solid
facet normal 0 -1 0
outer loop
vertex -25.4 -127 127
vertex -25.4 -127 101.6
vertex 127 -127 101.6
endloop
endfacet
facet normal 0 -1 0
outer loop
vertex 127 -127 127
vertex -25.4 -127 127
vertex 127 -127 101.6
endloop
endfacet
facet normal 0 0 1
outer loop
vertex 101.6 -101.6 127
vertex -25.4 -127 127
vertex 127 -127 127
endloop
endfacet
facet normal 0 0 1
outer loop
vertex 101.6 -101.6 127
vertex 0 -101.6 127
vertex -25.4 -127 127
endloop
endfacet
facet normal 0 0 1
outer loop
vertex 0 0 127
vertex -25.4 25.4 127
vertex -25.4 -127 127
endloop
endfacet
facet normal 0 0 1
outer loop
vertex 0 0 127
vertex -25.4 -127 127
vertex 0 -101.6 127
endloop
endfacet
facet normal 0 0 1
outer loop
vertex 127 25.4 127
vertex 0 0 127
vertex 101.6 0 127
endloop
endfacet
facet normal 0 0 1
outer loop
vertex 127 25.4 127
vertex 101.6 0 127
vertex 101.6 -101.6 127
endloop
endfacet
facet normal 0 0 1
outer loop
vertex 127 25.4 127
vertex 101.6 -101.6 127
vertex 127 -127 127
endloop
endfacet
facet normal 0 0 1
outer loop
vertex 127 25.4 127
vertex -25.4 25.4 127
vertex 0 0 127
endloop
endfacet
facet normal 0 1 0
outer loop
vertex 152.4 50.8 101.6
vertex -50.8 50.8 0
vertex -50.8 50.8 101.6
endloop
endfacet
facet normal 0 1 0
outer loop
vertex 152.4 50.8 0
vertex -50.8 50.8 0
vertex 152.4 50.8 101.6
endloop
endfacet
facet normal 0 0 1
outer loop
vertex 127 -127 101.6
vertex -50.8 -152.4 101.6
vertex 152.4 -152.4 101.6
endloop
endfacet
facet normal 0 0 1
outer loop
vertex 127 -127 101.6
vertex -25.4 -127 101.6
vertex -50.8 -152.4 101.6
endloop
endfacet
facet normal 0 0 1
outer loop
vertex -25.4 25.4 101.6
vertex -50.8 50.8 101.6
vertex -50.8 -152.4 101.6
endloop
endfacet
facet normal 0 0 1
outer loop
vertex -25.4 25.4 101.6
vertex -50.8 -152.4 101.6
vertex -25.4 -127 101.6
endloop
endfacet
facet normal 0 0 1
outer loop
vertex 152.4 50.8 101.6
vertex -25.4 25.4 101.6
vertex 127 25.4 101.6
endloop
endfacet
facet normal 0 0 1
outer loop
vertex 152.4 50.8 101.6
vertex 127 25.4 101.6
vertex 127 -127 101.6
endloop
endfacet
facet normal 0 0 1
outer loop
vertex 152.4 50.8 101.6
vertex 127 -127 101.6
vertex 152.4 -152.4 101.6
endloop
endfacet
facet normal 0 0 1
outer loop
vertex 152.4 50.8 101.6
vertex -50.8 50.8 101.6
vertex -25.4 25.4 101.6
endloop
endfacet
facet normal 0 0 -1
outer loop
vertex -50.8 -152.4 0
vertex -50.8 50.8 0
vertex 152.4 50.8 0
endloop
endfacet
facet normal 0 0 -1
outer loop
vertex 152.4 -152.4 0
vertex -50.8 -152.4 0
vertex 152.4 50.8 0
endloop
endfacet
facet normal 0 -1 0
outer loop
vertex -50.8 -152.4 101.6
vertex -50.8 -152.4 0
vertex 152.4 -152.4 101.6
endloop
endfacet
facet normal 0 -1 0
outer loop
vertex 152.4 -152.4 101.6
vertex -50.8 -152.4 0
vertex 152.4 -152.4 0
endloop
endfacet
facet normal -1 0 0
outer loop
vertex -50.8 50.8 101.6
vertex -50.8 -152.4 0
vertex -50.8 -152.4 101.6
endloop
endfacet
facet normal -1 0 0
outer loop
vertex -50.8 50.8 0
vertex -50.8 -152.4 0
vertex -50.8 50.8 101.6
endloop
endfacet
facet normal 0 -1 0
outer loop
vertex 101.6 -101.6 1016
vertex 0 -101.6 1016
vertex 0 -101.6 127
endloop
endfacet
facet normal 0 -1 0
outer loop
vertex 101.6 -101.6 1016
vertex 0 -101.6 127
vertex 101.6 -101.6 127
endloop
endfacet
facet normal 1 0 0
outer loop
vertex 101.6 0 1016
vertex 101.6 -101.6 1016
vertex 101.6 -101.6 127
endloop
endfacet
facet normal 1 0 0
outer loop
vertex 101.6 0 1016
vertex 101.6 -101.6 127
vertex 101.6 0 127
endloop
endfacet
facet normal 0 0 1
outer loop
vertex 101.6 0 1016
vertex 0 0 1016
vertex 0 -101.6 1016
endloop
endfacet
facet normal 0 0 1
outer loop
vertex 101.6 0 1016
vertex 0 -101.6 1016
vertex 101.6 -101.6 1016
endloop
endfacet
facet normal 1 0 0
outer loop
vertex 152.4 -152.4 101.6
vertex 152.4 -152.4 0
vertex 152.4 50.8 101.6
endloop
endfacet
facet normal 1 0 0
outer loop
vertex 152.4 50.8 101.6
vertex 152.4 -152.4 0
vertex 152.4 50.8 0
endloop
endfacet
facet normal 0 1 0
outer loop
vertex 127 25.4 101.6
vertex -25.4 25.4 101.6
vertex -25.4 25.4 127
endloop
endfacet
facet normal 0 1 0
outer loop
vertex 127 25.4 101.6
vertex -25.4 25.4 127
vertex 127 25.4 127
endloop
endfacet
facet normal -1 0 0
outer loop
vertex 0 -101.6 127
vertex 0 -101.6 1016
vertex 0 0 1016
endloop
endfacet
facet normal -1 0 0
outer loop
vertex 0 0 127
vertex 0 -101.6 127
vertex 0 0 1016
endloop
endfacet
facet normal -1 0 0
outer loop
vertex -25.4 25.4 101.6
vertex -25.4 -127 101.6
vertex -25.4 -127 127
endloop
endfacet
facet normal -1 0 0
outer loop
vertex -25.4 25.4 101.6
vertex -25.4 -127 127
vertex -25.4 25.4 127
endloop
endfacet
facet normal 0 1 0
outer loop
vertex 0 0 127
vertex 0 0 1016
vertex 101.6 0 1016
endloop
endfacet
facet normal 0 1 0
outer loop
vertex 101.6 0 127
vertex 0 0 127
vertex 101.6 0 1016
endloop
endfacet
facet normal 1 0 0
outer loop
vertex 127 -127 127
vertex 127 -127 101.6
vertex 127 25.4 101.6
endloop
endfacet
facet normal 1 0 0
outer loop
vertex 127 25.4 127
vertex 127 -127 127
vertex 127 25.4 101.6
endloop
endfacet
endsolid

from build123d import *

# Parameters (mm, degrees)
F0_W     = 101.6
F0_H     = 101.6
F1_DEPTH = 1016
F4_W     = 152.4
F4_H     = 152.4
F5_DEPTH = 127
F6_W     = 203.2
F6_H     = 203.2
F7_DEPTH = 101.6


with BuildPart() as f1:
    # F0 (on Top) → F1 (new body)
    with BuildSketch(Plane.XY):
        with Locations((50.8, -50.8)):
            Rectangle(F0_W, F0_H)
    extrude(amount=F1_DEPTH)

    # F4 (on Top) → F5 (join)
    with BuildSketch(Plane.XY):
        with Locations((50.8, -50.8)):
            Rectangle(F4_W, F4_H)
    extrude(amount=F5_DEPTH)

    # F6 (on Top) → F7 (join)
    with BuildSketch(Plane.XY):
        with Locations((50.8, -50.8)):
            Rectangle(F6_W, F6_H)
    extrude(amount=F7_DEPTH)


solid = f1.part
